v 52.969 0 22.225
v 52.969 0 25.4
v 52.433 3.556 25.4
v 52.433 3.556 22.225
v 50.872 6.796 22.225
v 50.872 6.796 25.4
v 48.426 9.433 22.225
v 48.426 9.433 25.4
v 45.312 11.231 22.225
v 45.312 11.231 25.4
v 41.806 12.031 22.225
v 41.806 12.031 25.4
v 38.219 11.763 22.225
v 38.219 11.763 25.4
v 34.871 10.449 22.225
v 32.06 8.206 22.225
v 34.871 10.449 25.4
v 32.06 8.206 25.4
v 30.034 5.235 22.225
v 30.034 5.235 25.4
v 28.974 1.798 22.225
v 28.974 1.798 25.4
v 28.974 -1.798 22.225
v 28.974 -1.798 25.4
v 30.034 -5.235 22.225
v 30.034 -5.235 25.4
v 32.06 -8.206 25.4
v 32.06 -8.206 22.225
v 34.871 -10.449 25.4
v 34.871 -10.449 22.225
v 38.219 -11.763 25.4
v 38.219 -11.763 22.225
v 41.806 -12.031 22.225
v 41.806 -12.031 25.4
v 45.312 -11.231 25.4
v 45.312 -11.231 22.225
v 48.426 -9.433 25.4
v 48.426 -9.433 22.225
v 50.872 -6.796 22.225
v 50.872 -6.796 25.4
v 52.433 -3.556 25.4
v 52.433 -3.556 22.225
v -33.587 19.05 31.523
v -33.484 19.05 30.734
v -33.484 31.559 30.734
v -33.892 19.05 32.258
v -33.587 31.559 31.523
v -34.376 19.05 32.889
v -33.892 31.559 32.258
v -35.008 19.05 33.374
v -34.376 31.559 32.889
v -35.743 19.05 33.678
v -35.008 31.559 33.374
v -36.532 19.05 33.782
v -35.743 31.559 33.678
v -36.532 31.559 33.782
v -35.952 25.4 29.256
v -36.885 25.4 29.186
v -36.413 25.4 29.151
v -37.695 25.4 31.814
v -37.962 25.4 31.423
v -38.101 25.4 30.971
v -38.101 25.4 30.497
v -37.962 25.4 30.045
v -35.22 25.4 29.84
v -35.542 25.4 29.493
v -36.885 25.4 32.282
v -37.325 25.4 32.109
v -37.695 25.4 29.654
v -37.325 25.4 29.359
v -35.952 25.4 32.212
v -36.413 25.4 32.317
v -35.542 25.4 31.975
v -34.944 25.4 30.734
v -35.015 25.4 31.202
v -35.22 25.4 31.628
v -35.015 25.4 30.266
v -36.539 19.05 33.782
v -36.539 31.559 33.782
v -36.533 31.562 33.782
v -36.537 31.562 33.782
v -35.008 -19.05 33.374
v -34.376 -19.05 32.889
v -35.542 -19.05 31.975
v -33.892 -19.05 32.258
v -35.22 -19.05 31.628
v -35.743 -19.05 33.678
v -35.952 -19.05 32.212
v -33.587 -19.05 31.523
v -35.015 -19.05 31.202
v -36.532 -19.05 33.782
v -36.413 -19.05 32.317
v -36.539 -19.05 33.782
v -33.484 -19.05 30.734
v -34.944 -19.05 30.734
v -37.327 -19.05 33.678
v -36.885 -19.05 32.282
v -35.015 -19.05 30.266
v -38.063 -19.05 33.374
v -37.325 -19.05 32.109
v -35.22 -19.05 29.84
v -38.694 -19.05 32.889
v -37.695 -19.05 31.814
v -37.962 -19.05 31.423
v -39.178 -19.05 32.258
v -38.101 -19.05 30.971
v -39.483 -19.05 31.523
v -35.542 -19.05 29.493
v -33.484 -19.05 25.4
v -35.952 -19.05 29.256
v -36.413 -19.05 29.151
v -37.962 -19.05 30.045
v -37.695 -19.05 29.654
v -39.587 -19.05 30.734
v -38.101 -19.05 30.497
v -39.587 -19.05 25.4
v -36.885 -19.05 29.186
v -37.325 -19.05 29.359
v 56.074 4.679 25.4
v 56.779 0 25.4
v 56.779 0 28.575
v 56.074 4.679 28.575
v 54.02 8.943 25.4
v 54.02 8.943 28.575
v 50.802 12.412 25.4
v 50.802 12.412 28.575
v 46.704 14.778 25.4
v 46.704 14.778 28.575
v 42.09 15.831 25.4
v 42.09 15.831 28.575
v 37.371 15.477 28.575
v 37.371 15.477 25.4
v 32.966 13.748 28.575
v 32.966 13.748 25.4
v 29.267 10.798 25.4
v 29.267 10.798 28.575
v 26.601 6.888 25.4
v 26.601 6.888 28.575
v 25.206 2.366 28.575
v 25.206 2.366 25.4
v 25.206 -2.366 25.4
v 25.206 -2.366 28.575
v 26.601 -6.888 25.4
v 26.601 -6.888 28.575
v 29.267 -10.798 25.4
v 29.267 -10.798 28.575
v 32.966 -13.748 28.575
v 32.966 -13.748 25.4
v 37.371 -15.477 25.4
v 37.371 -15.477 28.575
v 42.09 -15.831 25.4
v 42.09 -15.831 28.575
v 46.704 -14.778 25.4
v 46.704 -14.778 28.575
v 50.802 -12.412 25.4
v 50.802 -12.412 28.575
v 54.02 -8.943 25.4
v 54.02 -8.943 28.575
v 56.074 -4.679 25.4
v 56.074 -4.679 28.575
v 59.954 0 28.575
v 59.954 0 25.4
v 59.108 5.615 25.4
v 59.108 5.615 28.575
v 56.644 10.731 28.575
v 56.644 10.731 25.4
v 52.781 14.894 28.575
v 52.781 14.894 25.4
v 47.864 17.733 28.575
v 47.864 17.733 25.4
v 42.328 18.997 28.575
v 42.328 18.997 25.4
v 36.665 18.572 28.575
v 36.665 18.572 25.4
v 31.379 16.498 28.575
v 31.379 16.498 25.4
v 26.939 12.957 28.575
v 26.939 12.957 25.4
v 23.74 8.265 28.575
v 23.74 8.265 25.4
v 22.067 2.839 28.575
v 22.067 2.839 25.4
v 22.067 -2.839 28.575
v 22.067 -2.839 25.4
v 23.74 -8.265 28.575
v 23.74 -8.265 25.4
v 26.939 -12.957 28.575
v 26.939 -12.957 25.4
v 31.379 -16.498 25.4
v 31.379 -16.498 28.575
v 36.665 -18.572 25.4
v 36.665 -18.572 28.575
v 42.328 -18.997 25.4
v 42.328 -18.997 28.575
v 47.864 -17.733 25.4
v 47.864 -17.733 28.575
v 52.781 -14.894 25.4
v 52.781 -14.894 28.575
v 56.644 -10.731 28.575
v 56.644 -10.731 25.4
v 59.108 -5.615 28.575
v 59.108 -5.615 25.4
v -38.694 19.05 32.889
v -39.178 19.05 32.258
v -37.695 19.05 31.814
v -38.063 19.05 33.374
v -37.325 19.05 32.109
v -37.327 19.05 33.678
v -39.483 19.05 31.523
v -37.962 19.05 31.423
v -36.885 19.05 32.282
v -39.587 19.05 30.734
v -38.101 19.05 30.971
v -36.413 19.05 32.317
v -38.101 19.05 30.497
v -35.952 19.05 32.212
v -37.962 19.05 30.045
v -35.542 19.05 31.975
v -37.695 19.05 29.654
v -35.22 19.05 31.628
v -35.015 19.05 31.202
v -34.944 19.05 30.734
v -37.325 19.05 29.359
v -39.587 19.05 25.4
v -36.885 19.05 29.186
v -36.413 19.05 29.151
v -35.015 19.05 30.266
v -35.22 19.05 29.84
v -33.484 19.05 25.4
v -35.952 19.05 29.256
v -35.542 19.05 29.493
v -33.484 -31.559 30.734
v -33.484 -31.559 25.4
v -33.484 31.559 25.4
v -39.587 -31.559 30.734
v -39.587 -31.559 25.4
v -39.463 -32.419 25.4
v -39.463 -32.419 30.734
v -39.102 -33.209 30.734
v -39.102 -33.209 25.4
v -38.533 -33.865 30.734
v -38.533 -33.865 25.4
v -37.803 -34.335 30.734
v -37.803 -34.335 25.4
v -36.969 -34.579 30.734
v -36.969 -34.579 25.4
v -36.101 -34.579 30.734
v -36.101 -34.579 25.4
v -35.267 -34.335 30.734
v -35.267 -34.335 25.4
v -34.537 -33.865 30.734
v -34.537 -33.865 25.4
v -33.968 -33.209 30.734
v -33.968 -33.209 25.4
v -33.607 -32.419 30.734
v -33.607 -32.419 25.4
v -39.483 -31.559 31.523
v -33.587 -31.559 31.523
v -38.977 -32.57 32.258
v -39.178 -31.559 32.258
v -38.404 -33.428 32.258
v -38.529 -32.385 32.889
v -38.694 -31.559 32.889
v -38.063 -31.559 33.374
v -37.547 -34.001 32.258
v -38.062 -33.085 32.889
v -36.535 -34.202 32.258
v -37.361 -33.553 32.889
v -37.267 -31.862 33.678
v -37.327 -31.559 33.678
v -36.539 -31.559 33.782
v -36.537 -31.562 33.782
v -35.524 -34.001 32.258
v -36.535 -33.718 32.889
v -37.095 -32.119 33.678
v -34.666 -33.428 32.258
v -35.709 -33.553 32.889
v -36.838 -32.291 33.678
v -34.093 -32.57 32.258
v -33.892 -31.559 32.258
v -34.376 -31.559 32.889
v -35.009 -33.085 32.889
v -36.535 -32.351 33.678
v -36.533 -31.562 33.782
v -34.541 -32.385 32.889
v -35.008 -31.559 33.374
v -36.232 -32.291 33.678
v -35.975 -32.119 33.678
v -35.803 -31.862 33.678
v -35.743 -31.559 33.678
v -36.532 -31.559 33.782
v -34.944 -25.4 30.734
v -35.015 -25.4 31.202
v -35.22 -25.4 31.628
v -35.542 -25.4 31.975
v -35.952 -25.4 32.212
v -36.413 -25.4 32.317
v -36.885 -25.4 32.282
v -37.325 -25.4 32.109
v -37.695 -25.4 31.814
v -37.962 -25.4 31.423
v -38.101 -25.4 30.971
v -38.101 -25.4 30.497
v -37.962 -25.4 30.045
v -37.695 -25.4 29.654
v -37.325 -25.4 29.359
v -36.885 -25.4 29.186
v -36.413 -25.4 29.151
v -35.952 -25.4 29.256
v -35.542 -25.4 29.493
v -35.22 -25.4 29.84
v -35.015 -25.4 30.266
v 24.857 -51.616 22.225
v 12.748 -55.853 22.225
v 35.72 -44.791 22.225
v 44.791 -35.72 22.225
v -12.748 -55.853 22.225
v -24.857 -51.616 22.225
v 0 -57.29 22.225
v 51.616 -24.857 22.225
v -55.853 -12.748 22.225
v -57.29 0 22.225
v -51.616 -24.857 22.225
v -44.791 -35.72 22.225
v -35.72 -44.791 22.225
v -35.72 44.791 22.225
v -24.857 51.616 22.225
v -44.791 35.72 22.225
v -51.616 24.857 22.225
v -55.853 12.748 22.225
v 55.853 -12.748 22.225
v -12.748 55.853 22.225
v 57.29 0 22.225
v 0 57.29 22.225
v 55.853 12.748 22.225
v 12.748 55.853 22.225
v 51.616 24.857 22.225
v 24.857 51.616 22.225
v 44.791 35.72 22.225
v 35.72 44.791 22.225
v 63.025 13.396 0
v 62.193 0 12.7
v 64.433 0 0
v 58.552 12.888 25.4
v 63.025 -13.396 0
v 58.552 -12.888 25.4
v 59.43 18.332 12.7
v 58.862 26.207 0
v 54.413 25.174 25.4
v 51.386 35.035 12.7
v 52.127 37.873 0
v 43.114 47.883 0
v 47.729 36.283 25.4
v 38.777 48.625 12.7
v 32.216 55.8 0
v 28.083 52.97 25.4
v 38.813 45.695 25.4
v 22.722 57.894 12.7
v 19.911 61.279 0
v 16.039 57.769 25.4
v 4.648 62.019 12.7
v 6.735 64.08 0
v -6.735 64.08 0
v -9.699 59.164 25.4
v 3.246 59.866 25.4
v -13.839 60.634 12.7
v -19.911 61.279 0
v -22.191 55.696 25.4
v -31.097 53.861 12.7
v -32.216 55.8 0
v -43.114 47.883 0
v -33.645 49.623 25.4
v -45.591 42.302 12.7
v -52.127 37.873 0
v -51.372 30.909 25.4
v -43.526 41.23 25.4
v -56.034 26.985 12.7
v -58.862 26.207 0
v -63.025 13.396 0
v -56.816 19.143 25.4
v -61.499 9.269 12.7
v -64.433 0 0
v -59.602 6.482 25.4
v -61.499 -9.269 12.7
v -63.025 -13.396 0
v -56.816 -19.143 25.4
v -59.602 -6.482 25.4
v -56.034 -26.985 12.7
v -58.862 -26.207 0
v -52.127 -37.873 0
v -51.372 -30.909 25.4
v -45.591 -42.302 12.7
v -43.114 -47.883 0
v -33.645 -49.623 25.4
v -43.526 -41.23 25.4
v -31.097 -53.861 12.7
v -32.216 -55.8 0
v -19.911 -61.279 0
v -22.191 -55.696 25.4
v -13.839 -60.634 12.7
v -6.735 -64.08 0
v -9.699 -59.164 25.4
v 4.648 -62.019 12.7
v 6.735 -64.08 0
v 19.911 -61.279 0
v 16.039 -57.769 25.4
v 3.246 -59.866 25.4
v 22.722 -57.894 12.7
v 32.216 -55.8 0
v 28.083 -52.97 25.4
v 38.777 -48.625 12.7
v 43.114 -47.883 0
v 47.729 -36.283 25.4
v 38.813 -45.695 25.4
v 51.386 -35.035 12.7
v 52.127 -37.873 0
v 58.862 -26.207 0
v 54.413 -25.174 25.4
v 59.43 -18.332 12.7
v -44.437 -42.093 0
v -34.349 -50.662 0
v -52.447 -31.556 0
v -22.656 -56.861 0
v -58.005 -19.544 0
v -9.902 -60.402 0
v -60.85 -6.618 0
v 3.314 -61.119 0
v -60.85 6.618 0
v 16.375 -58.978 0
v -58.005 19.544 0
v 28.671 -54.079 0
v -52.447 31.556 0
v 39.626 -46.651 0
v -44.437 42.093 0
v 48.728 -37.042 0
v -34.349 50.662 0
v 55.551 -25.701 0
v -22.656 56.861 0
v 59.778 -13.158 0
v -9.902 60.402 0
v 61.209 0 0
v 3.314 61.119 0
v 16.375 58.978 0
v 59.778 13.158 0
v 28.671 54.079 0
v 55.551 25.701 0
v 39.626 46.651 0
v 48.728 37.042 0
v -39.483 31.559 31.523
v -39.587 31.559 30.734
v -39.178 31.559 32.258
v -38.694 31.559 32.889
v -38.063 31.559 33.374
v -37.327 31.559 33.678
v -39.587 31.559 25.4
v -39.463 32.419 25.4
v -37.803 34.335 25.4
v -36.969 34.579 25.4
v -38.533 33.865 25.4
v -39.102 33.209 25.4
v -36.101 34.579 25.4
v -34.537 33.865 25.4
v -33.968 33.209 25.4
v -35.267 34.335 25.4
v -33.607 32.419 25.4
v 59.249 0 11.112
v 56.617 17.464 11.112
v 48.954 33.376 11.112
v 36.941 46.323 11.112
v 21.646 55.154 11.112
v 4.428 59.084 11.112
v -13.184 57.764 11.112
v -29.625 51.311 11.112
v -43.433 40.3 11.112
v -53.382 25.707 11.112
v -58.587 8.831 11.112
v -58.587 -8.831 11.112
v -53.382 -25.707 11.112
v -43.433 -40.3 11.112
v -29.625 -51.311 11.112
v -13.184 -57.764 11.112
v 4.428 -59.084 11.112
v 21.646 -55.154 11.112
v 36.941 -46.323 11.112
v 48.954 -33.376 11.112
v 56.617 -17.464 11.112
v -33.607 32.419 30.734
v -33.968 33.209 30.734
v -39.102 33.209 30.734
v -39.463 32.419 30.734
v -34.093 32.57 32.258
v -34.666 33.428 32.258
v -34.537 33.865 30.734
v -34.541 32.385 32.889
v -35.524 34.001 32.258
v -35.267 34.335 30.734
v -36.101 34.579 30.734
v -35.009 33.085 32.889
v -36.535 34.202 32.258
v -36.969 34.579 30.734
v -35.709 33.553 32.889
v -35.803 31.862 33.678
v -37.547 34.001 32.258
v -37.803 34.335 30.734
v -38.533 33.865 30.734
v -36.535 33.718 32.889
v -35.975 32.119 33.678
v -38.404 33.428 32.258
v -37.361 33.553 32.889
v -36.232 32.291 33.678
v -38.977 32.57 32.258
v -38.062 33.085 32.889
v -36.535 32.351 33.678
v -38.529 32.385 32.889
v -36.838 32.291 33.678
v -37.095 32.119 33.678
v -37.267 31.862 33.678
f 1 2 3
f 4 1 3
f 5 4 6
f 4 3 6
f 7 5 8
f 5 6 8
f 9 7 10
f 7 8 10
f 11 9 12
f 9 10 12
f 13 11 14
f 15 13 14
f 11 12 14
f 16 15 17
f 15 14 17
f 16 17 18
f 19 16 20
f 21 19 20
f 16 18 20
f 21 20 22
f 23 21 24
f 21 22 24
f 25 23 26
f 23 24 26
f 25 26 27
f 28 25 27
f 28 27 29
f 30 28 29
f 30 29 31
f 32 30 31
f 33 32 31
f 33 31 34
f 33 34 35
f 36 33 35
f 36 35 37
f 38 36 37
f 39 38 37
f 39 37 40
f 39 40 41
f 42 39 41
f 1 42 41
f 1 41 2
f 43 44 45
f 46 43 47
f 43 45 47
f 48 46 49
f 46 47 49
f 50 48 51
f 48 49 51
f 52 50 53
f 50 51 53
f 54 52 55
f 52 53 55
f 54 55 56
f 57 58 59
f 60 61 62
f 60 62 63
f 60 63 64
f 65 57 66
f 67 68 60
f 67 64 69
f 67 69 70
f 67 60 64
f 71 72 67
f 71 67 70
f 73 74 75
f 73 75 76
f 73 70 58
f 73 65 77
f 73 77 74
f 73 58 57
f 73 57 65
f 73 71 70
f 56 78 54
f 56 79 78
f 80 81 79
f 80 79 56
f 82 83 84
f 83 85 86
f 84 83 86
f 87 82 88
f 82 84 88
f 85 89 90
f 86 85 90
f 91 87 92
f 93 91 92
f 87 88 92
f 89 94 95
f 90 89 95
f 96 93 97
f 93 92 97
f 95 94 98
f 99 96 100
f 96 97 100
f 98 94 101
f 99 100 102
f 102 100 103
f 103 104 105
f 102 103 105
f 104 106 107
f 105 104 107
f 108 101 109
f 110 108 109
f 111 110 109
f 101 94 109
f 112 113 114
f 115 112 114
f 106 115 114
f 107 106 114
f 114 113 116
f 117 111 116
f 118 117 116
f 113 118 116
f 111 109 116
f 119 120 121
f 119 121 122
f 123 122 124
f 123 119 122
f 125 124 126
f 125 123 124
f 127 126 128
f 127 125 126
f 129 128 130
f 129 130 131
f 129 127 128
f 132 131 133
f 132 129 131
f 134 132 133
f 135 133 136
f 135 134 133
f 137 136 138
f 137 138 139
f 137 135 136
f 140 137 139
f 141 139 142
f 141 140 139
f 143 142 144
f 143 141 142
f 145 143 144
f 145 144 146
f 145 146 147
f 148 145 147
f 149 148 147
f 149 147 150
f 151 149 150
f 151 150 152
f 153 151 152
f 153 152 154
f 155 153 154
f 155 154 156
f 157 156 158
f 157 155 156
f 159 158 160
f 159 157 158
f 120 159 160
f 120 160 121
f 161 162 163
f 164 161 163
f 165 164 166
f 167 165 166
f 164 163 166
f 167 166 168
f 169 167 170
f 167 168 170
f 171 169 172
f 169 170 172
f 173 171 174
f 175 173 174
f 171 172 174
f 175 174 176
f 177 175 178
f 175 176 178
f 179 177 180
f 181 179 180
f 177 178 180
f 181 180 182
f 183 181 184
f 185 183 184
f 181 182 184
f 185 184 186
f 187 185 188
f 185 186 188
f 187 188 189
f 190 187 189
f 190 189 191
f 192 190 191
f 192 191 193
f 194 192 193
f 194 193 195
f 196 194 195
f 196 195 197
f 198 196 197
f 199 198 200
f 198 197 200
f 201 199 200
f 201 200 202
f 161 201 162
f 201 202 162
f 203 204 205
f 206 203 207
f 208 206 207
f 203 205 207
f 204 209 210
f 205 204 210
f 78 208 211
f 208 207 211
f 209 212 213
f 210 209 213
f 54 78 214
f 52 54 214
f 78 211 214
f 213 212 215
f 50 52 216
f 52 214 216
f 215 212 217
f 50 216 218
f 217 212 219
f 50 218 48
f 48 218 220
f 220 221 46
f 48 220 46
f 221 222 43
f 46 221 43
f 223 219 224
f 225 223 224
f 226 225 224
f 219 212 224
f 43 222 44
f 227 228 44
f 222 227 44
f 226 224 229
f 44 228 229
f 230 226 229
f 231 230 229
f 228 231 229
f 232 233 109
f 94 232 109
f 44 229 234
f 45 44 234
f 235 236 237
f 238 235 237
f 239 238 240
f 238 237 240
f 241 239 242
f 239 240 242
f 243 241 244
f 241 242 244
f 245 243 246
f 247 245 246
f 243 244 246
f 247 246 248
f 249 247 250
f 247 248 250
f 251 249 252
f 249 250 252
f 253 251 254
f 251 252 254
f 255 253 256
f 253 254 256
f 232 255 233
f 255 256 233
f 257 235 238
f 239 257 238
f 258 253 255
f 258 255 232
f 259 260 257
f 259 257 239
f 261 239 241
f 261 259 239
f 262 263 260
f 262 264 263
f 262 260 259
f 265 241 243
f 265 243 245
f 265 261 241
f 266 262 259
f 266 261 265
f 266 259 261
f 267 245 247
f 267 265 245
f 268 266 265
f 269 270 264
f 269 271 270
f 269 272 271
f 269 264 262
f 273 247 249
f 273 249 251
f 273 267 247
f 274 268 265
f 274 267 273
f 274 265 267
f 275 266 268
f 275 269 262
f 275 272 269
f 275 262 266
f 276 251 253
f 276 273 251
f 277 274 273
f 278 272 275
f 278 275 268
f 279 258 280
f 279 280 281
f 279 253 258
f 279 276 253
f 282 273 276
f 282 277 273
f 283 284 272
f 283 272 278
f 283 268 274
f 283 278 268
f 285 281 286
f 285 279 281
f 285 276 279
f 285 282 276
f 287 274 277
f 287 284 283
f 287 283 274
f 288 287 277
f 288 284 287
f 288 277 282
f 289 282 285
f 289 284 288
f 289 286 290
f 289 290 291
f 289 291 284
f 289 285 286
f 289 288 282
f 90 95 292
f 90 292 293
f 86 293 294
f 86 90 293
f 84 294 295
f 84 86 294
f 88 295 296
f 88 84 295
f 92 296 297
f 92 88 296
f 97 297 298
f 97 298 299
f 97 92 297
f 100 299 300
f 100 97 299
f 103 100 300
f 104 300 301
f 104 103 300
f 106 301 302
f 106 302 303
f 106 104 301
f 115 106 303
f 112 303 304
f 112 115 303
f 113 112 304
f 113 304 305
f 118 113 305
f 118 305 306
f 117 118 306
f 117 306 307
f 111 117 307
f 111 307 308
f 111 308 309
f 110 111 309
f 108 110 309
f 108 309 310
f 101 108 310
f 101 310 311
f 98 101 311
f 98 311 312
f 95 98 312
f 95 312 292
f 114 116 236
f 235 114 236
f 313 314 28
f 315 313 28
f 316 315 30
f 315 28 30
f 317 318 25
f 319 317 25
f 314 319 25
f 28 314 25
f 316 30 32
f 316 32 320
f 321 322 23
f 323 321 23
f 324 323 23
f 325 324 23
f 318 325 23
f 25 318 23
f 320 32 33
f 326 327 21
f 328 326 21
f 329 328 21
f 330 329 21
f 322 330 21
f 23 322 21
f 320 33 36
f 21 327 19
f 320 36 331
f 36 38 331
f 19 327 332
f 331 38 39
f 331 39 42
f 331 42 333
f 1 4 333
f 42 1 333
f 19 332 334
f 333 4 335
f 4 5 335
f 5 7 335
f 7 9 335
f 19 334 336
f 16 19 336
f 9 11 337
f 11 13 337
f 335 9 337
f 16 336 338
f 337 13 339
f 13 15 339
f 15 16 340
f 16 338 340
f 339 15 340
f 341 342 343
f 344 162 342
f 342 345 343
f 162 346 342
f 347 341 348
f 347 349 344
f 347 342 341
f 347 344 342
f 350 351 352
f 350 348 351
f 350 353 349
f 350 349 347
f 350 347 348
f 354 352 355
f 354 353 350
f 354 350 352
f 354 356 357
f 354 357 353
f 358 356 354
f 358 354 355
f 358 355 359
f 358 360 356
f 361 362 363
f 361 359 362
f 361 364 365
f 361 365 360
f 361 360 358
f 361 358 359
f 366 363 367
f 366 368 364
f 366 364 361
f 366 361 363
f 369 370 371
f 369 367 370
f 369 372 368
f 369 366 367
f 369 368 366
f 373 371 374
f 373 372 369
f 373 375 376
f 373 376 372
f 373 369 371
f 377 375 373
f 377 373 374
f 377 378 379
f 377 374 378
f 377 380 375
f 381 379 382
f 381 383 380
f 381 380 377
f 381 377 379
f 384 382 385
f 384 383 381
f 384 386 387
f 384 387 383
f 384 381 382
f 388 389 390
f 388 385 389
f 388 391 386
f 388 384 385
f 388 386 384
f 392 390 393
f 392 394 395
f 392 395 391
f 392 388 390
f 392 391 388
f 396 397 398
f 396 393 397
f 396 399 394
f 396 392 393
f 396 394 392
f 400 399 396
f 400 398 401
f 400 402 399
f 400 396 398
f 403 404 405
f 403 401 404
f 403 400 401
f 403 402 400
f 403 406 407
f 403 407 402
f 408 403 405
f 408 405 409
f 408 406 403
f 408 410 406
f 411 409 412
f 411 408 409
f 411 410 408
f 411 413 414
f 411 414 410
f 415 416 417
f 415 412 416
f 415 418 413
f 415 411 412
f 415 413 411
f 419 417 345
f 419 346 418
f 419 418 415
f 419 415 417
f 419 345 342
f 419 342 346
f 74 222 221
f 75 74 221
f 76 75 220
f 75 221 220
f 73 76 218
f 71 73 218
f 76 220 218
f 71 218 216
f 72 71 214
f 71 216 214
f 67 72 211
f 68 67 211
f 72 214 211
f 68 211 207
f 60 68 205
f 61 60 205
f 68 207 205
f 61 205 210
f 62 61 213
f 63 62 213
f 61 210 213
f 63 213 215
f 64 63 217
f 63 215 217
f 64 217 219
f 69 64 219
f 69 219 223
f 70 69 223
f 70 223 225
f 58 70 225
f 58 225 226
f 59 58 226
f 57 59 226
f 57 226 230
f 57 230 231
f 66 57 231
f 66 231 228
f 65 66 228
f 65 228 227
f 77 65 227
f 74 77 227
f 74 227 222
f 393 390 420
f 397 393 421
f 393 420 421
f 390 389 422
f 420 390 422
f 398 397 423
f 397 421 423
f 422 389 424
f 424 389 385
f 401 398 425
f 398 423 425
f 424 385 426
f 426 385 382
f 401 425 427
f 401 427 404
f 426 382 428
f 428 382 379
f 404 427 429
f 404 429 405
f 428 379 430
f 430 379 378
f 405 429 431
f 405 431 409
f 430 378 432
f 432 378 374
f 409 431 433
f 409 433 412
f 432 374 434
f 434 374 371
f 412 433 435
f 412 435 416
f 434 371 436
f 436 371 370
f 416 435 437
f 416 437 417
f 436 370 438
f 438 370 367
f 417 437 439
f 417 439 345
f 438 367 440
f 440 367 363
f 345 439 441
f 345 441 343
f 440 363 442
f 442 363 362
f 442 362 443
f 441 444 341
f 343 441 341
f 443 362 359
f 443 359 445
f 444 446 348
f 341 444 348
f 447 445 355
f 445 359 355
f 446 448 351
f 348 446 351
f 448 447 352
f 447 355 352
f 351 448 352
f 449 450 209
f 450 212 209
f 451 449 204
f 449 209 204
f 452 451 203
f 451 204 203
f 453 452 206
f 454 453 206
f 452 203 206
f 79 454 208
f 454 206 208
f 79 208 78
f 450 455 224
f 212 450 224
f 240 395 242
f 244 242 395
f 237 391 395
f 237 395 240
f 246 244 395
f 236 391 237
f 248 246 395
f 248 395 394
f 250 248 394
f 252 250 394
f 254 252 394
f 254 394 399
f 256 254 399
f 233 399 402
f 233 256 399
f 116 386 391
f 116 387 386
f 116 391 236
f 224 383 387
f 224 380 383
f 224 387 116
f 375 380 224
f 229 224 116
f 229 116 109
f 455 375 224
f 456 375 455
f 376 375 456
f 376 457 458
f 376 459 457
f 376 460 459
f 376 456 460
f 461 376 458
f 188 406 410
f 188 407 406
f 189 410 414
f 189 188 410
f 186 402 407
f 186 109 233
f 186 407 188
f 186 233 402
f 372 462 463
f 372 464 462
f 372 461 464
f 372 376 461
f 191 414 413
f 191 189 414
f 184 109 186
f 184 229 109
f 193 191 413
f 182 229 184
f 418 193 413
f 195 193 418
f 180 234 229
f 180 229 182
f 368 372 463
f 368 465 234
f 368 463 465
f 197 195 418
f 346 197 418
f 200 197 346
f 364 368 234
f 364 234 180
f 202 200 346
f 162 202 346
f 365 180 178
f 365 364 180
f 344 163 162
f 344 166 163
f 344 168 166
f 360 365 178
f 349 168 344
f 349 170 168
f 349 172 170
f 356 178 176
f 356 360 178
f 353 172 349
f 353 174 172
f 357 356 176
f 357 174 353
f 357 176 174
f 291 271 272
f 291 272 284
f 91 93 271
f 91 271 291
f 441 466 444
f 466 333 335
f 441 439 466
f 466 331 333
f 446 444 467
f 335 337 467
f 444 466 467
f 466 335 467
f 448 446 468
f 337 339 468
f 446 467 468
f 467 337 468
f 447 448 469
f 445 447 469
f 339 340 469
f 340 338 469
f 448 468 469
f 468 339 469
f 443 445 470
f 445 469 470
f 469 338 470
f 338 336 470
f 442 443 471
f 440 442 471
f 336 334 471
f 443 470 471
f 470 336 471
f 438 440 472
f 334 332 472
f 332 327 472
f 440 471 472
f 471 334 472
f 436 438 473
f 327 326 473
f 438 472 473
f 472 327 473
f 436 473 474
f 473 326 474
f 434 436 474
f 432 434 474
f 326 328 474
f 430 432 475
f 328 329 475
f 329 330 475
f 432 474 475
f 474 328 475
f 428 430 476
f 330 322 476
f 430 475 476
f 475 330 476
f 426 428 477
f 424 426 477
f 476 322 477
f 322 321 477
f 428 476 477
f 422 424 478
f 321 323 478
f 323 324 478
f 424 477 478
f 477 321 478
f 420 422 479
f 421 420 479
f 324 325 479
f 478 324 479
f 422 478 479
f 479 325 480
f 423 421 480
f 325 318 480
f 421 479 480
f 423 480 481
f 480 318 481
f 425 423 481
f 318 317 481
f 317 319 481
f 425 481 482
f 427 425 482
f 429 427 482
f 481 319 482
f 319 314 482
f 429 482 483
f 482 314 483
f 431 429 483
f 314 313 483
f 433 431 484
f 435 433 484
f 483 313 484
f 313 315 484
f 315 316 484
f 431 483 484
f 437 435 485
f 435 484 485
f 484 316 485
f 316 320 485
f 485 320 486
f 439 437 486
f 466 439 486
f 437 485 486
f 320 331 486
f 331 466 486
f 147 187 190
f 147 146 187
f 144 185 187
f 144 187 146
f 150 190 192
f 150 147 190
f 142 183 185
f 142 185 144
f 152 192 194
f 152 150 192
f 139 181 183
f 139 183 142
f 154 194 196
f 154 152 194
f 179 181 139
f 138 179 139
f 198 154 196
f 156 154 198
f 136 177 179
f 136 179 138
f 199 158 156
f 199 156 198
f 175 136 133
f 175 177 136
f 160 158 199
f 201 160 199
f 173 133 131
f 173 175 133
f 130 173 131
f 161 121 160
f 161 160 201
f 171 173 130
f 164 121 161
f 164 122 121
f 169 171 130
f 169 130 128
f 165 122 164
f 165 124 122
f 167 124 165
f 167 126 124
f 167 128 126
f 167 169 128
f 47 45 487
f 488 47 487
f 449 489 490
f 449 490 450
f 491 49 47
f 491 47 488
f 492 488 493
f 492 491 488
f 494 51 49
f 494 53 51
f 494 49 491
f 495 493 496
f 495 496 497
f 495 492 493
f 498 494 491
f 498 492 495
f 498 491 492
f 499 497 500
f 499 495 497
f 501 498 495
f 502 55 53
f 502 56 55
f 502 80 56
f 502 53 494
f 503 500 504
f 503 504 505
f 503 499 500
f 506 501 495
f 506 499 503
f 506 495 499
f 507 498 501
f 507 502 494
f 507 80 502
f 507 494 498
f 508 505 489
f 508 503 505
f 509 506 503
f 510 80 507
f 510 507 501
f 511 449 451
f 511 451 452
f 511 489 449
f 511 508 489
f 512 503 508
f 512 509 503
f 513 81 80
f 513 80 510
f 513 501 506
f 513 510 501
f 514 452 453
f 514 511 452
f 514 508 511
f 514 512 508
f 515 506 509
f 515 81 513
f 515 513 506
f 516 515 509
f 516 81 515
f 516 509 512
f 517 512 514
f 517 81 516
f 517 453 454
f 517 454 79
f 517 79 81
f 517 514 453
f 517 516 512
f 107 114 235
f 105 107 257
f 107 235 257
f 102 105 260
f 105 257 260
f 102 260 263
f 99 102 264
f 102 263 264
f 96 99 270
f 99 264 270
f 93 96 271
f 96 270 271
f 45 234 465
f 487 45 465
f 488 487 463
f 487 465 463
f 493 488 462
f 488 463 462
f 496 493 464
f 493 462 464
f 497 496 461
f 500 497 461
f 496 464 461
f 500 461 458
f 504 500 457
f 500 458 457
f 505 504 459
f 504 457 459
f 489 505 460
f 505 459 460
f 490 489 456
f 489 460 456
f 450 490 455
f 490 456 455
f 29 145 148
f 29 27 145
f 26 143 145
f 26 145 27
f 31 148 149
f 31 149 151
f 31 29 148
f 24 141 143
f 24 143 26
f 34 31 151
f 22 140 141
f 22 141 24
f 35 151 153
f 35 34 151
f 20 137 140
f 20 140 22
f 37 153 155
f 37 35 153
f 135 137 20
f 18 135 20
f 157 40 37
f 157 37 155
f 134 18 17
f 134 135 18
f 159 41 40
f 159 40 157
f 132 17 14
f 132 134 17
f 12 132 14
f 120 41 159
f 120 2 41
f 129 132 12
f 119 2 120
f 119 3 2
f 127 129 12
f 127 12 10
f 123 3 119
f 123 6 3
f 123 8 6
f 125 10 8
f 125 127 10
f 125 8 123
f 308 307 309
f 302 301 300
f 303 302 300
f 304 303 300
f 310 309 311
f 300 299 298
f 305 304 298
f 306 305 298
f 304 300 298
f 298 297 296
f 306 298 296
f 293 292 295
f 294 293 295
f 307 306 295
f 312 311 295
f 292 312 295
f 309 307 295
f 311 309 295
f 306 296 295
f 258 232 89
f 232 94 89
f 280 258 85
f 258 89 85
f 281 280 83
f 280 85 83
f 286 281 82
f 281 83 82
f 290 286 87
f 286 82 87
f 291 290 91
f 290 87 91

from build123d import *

# Parameters (mm, degrees)
F0_R           = 64.4326190009
F1_DEPTH       = 25.4
F1_TAPER       = 10
F2_T           = -3.175
F3_R           = 19.05
F3_R_2         = 15.875
F4_DEPTH       = 3.175
F3_R_3         = 12.065
F5_DEPTH       = 25.4
F7_DEPTH       = 8.382
F8_R           = 3.048
F9_R           = 1.5875
F10_DEPTH      = 25.4
F10_DEPTH_BACK = 25.4


with BuildPart() as f1:
    # F0 (on Top) → F1 (new body)
    with BuildSketch(Plane.XY):
        Circle(F0_R)
    extrude(amount=F1_DEPTH, taper=F1_TAPER)

    # F2
    f2_openings = [f1.faces().sort_by_distance(p)[0] for p in [
        (0, 0, 0),
    ]]
    offset(amount=F2_T, openings=f2_openings)

    # F3 (on face) → F4 (join)
    with BuildSketch(Plane.XY.offset(25.4)):
        with Locations((40.9039136909, 0)):
            Circle(F3_R)
        with Locations((40.9039136909, 0)):
            Circle(F3_R_2, mode=Mode.SUBTRACT)
    extrude(amount=F4_DEPTH)

    # F3 (on face) → F5 (cut)
    with BuildSketch(Plane.XY.offset(25.4)):
        with Locations((40.9039136909, 0)):
            Circle(F3_R_3)
    extrude(amount=-F5_DEPTH, mode=Mode.SUBTRACT)

    # F6 (on face) → F7 (join)
    with BuildSketch(Plane.XY.offset(25.4)):
        with BuildLine():
            Line((-33.4835186865, -31.5588308226), (-33.4835186865, -19.05))
            Line((-33.4835186865, -19.05), (-39.5865455006, -19.05))
            Line((-39.5865455006, -19.05), (-39.5865455006, -31.5588308226))
            ThreePointArc((-39.5865455006, -31.5588308226), (-36.5350320935, -34.6103442296), (-33.4835186865, -31.5588308226))
        make_face()
        with BuildLine():
            Line((-39.5865455006, 31.5588308226), (-39.5865455006, 19.05))
            Line((-39.5865455006, 19.05), (-33.4835186865, 19.05))
            Line((-33.4835186865, 19.05), (-33.4835186865, 31.5588308226))
            ThreePointArc((-33.4835186865, 31.5588308226), (-36.5350320935, 34.6103442296), (-39.5865455006, 31.5588308226))
        make_face()
    extrude(amount=F7_DEPTH)

    # F8
    f8_edges = [f1.edges().sort_by_distance(p)[0] for p in [
        (-33.483519, -25.304415, 33.782),
        (-39.586546, -25.304415, 33.782),
        (-36.535032, -34.610344, 33.782),
        (-33.483519, 25.304415, 33.782),
    ]]
    fillet(f8_edges, radius=F8_R)

    # F9 (on Front) → F10 (cut, two sides)
    with BuildSketch(Plane.XZ) as f10_sk:
        with Locations((-36.5315186865, 30.734)):
            Circle(F9_R)
    extrude(amount=F10_DEPTH, mode=Mode.SUBTRACT)
    extrude(f10_sk.sketch, amount=-F10_DEPTH_BACK, mode=Mode.SUBTRACT)


solid = f1.part
